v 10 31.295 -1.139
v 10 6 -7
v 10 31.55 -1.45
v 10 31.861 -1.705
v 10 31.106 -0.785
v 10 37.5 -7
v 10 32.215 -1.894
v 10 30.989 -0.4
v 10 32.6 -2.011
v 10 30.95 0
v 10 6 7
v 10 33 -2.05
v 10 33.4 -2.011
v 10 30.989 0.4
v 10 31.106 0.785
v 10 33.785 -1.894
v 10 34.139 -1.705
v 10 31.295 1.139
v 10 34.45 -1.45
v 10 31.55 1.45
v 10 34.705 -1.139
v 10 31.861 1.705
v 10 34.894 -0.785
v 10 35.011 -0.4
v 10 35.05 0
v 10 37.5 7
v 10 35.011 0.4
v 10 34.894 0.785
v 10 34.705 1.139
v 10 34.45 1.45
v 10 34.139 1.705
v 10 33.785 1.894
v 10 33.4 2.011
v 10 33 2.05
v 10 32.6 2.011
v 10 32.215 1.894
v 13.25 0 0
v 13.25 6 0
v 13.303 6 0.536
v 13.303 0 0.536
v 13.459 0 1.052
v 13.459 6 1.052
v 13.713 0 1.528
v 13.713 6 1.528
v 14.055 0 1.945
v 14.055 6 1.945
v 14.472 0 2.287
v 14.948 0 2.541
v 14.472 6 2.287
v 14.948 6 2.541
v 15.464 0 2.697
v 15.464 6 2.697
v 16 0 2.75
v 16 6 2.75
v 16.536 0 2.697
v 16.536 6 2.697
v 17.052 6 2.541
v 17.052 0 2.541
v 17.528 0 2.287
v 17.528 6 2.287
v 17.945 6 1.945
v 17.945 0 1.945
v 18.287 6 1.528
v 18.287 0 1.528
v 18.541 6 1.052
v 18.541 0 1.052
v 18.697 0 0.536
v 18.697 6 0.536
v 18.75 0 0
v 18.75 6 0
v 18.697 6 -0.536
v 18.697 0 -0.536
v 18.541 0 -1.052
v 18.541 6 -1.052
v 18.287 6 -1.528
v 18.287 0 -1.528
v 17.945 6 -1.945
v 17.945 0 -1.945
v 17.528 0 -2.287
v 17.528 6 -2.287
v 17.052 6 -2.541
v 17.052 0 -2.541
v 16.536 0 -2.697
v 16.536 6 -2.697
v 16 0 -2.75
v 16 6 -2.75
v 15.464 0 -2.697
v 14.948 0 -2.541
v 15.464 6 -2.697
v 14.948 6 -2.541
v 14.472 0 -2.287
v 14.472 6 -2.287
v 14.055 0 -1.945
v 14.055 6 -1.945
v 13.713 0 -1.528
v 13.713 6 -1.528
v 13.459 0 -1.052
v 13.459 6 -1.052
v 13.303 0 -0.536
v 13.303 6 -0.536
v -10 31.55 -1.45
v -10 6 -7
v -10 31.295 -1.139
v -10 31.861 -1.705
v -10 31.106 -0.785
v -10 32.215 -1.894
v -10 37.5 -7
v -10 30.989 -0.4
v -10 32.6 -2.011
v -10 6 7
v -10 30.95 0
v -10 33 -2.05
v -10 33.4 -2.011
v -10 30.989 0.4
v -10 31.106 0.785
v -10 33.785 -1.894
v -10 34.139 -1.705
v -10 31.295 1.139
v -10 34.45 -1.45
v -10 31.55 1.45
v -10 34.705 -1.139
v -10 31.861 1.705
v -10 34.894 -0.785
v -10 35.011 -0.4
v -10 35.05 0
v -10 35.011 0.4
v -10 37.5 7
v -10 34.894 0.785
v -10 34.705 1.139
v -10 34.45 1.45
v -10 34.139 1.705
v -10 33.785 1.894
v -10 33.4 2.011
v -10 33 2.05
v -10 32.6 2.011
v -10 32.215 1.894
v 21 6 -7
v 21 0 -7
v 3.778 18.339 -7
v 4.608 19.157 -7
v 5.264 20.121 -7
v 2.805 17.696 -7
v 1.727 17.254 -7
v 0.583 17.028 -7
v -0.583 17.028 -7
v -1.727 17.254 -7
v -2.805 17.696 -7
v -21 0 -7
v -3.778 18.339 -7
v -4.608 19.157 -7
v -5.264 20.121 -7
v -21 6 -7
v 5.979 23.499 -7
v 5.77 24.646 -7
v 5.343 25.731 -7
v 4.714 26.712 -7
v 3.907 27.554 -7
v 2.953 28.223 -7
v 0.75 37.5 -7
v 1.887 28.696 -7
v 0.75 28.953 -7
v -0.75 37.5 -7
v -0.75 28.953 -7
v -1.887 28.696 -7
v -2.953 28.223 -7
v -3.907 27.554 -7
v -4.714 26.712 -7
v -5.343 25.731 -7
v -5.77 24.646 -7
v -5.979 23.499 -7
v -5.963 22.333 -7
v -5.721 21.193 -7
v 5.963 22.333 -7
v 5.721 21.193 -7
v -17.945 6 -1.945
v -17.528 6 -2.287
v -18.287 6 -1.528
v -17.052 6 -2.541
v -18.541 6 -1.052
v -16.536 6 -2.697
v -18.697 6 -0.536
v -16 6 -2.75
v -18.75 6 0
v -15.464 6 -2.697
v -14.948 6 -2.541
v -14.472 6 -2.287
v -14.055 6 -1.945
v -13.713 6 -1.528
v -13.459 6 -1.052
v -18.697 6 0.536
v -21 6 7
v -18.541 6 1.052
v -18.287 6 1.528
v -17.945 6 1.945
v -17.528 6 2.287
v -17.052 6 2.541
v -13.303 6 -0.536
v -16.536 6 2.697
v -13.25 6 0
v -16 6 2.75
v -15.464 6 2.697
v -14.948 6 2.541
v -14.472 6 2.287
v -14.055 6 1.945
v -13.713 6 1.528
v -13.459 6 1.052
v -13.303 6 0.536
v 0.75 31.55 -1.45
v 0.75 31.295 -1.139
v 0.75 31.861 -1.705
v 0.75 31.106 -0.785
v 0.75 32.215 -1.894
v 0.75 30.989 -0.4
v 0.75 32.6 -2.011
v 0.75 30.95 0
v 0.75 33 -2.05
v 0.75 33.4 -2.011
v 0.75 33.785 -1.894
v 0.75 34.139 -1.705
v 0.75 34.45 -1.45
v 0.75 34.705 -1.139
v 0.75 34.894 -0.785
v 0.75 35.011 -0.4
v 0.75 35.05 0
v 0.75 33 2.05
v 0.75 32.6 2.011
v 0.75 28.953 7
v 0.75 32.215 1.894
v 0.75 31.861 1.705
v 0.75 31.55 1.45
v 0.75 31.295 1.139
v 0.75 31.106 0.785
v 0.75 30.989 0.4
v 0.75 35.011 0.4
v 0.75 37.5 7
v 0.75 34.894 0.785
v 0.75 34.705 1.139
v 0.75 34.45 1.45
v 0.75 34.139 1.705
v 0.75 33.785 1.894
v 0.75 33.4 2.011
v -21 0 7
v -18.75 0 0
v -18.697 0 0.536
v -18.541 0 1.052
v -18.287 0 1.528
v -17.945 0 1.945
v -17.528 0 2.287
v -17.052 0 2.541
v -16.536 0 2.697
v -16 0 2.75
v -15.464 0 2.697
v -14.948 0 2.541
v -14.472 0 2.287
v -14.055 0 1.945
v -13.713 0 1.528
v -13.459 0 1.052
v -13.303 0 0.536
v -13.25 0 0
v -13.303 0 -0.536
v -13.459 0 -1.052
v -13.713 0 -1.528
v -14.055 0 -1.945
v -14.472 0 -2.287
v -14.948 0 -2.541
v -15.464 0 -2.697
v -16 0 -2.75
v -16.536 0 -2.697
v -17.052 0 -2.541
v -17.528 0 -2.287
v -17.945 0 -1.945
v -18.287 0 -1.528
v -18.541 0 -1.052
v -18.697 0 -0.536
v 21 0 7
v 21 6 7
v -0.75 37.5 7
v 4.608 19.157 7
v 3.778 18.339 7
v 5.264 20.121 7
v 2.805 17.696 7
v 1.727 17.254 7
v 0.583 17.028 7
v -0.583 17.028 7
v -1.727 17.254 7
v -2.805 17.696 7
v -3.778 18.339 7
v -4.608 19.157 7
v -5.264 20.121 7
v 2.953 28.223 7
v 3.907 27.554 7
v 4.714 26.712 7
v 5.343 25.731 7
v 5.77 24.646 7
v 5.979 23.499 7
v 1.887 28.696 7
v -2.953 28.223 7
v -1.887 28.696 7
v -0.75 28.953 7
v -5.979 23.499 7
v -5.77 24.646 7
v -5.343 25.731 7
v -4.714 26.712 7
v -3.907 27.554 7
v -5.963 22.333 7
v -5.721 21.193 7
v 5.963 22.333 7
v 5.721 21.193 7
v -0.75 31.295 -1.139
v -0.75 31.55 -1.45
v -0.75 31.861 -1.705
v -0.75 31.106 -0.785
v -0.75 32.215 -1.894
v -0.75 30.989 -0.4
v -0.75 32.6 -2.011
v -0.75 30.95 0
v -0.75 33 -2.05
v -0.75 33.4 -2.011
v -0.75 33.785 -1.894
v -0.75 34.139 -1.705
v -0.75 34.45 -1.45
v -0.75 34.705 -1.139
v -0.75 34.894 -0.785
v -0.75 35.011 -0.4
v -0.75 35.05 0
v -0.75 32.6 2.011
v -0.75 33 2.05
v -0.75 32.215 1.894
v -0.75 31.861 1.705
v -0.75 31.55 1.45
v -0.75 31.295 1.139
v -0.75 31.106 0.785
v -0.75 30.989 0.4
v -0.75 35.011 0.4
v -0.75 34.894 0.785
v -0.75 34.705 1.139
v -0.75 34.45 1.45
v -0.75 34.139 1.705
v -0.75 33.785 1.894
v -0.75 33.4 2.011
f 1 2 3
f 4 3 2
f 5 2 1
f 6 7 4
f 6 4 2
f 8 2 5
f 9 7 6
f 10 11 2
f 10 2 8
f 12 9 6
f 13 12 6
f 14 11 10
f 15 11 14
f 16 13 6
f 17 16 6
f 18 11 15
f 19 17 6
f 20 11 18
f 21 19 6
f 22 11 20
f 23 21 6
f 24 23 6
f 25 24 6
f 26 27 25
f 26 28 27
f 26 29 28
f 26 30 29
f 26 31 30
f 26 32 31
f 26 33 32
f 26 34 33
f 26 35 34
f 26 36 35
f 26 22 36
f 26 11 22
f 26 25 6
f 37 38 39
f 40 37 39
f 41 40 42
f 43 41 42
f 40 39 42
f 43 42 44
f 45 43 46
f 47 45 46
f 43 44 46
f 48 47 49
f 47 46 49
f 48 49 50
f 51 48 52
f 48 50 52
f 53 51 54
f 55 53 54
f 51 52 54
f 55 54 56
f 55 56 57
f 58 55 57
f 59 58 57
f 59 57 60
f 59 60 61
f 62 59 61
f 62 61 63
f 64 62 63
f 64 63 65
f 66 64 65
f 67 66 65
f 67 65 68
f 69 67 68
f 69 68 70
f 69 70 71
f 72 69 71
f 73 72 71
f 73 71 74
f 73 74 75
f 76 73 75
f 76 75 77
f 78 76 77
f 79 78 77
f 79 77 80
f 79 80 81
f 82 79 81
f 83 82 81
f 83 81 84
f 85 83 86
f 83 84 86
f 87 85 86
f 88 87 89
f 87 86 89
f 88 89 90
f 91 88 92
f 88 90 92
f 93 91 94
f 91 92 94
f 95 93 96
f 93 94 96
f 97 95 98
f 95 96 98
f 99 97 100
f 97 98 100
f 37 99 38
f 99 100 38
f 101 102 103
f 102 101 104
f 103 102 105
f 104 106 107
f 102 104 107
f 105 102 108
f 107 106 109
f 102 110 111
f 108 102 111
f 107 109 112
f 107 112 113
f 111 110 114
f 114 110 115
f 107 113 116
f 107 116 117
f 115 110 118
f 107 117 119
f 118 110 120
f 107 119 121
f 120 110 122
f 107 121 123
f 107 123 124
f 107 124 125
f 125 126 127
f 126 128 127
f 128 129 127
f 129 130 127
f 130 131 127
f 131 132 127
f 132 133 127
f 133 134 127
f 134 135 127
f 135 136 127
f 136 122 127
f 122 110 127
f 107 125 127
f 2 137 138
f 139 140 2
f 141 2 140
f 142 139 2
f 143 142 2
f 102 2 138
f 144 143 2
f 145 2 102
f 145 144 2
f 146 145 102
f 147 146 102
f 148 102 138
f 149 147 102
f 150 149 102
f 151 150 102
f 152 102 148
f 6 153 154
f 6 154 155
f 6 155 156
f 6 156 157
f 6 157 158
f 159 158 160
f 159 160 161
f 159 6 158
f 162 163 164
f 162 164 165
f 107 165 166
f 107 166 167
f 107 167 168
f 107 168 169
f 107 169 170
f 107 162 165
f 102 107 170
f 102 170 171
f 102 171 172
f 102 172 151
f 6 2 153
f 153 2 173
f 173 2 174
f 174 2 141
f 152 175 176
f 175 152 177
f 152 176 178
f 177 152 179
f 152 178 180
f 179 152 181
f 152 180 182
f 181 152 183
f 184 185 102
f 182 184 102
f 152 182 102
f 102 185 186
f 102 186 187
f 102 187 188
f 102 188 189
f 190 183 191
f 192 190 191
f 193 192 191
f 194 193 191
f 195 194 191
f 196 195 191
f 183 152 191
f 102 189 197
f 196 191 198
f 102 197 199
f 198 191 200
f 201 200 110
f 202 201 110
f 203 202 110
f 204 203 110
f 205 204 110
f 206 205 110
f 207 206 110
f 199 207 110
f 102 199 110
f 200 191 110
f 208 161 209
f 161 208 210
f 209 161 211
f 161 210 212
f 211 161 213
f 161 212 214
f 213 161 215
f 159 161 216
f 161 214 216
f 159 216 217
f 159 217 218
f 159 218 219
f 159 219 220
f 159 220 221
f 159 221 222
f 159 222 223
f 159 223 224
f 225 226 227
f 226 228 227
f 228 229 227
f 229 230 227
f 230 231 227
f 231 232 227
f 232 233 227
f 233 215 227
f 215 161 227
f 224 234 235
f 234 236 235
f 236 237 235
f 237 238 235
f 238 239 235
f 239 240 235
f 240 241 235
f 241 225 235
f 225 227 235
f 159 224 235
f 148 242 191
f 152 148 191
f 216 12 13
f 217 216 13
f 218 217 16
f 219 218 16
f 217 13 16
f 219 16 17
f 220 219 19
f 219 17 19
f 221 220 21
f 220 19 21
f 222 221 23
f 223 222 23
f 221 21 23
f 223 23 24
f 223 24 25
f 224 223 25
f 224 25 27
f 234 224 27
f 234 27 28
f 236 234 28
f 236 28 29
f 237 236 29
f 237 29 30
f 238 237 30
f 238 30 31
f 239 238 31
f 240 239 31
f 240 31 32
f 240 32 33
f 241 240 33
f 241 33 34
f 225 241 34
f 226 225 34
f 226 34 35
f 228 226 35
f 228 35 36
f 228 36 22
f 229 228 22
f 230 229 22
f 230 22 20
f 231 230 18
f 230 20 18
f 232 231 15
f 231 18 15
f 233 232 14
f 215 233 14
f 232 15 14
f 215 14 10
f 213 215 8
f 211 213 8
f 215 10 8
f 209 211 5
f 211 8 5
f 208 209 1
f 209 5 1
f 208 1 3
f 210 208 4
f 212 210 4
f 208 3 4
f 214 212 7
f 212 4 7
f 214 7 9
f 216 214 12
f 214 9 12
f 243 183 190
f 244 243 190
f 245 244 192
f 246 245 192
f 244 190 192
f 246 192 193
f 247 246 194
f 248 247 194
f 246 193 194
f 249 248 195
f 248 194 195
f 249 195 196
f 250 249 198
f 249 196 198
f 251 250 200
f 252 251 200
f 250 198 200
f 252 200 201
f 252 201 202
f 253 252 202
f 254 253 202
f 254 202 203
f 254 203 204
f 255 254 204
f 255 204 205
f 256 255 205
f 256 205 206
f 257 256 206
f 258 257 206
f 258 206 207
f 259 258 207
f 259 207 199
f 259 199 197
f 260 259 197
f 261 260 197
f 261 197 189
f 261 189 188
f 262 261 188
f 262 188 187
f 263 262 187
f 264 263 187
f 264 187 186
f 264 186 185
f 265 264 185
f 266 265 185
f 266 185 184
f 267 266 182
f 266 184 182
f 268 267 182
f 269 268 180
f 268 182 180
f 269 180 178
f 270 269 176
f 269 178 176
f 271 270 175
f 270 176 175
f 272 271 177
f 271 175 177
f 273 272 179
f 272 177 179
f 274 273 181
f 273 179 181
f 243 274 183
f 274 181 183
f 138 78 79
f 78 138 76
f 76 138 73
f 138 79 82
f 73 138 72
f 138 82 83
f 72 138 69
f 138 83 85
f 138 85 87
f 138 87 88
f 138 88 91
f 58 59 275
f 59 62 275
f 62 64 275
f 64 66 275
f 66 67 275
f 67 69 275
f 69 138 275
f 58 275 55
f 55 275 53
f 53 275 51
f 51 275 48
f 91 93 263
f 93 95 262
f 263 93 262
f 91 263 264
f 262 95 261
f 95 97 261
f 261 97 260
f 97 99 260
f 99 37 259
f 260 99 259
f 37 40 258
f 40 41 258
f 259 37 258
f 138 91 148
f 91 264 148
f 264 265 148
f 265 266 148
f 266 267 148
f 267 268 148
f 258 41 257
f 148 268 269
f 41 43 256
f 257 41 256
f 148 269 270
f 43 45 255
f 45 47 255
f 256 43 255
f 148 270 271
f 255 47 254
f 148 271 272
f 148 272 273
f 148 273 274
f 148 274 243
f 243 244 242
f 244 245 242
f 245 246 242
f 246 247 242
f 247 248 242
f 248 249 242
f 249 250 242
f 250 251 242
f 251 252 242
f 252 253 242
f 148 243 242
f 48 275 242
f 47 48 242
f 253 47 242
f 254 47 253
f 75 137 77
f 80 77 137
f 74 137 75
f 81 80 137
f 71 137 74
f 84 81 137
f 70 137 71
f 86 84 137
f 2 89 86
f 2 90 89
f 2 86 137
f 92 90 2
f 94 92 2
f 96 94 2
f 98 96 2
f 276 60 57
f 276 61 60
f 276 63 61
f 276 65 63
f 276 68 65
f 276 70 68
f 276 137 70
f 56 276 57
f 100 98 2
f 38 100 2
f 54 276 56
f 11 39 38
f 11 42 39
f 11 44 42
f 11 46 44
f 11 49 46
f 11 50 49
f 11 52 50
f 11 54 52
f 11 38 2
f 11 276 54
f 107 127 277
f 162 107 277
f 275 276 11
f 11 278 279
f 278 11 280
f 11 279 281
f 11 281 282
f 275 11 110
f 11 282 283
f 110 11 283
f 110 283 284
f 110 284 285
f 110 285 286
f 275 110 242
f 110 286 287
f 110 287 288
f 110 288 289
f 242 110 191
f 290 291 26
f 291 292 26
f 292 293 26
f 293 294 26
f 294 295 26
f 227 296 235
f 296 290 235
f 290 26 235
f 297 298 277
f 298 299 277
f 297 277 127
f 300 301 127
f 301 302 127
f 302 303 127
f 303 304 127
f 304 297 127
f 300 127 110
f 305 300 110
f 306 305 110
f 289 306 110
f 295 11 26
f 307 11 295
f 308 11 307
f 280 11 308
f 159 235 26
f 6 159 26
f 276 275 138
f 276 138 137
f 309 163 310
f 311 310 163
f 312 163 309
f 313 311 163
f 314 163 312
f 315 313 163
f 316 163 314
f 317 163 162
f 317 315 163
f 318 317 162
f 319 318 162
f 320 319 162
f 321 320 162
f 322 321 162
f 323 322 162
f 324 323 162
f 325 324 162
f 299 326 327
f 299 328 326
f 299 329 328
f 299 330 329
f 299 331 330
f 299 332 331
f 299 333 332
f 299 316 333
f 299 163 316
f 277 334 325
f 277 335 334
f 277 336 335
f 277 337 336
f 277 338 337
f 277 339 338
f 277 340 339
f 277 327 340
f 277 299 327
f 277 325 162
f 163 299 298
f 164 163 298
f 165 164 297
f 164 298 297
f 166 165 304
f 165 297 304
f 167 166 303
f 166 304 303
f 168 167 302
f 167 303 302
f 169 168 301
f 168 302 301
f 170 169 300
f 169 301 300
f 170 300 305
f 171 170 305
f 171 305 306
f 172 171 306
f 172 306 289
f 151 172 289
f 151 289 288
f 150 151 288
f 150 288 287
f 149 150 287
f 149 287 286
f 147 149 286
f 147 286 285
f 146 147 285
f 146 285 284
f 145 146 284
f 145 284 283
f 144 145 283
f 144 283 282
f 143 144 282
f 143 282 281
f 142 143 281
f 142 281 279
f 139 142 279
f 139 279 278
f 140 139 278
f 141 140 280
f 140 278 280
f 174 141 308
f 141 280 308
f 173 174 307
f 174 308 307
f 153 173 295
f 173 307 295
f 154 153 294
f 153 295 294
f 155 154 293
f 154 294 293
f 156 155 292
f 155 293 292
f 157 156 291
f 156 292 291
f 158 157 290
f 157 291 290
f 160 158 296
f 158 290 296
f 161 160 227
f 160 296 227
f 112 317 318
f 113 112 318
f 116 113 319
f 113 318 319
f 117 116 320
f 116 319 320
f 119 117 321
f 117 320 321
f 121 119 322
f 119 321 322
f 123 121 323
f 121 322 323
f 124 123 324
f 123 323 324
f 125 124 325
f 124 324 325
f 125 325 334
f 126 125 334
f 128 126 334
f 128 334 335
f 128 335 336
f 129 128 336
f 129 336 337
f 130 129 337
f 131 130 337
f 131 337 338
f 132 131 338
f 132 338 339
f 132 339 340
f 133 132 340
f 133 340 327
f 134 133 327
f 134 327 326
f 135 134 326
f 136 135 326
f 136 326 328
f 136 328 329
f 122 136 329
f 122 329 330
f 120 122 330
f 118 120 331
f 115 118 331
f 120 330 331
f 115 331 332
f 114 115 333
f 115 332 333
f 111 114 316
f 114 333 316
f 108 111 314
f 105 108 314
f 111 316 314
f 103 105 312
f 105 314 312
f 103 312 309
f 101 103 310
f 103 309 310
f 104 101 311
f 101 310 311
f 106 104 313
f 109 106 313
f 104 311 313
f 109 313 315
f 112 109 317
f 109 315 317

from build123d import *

# Parameters (mm, degrees)
BOSS_EXTRUDE1_DEPTH = 7
SKETCH2_R           = 6
CUT_EXTRUDE1_DEPTH  = 46.202322949
SKETCH3_R           = 2.05
CUT_EXTRUDE2_DEPTH  = 50.155365933
SKETCH4_R           = 2.75
CUT_EXTRUDE3_DEPTH  = 14
SKETCH5_W           = 1.5
SKETCH5_H           = 29
CUT_EXTRUDE4_DEPTH  = 46.202322949


with BuildPart() as part:
    # Sketch1 → Boss-Extrude1 (new, symmetric)
    with BuildSketch(Plane.XY):
        Polygon((0, 0), (21, 0), (21, 6), (10, 6), (10, 37.5), (0, 37.5), align=None)
    boss_extrude1 = extrude(amount=BOSS_EXTRUDE1_DEPTH, both=True)

    # Mirror1: Boss-Extrude1 across plane
    add(boss_extrude1.mirror(Plane(origin=(0, 37.5, 7), x_dir=(0, 0, 1), z_dir=(1, 0, 0))))

    # Sketch2 → Cut-Extrude1 (cut, through all)
    with BuildSketch(Plane.XY.offset(7)):
        with Locations((0, 23)):
            Circle(SKETCH2_R)
    extrude(amount=-CUT_EXTRUDE1_DEPTH, mode=Mode.SUBTRACT)

    # Sketch3 → Cut-Extrude2 (cut, through all)
    with BuildSketch(Plane(origin=(10, 0, 0), x_dir=(0, 0, -1), z_dir=(1, 0, 0))):
        with Locations((0, 33)):
            Circle(SKETCH3_R)
    extrude(amount=-CUT_EXTRUDE2_DEPTH, mode=Mode.SUBTRACT)

    # Sketch4 → Cut-Extrude3 (cut)
    with BuildSketch(Plane(origin=(0, 6, 0), x_dir=(1, 0, 0), z_dir=(0, 1, 0))):
        with Locations(Location((-16, 0, 0), (0, 0, 180))):
            Circle(SKETCH4_R)
        with Locations(Location((16, 0, 0), (0, 0, 180))):
            Circle(SKETCH4_R)
    extrude(amount=-CUT_EXTRUDE3_DEPTH, mode=Mode.SUBTRACT)

    # Sketch5 → Cut-Extrude4 (cut, through all)
    with BuildSketch(Plane.XY.offset(7)):
        with Locations((0, 37.5)):
            Rectangle(SKETCH5_W, SKETCH5_H)
    extrude(amount=-CUT_EXTRUDE4_DEPTH, mode=Mode.SUBTRACT)


solid = part.part
